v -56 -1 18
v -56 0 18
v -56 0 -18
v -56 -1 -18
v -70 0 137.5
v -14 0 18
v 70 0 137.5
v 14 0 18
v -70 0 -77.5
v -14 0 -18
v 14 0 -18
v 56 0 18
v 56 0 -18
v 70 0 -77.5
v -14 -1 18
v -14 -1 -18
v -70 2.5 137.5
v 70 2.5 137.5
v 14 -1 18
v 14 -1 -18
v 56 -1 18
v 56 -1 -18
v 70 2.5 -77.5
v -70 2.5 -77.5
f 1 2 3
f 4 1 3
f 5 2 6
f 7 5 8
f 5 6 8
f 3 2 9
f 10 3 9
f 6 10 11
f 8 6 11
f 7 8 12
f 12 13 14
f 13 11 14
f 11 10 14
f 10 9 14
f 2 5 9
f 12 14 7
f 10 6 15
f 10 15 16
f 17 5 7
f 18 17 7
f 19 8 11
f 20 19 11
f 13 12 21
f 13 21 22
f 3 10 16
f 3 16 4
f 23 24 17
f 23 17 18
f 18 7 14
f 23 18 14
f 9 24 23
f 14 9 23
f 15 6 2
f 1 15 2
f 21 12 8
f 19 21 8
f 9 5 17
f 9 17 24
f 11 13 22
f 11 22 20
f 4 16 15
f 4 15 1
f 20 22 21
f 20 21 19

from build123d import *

# Parameters (mm, degrees)
CROQUIS1_W              = 140
CROQUIS1_H              = 275
SALIENTE_EXTRUIR1_DEPTH = 2.5
CROQUIS2_W              = 42
CROQUIS2_H              = 36
SALIENTE_EXTRUIR2_DEPTH = 1
CROQUIS3_W              = 140
CROQUIS3_H              = 60
CORTAR_EXTRUIR1_DEPTH   = 4.5


with BuildPart() as part:
    # Croquis1 → Saliente-Extruir1 (new body)
    with BuildSketch(Plane(origin=(0, 0, 0), x_dir=(1, 0, 0), z_dir=(0, 1, 0))):
        Rectangle(CROQUIS1_W, CROQUIS1_H)
    extrude(amount=SALIENTE_EXTRUIR1_DEPTH)

    # Croquis2 → Saliente-Extruir2 (add)
    with BuildSketch(Plane(origin=(0, 0, 0), x_dir=(-1, 0, 0), z_dir=(0, -1, 0))):
        with Locations((35, 0)):
            Rectangle(CROQUIS2_W, CROQUIS2_H)
        with Locations((-35, 0)):
            Rectangle(CROQUIS2_W, CROQUIS2_H)
    extrude(amount=SALIENTE_EXTRUIR2_DEPTH)

    # Croquis3 → Cortar-Extruir1 (cut, through all)
    with BuildSketch(Plane(origin=(0, 2.5, 0), x_dir=(1, 0, 0), z_dir=(0, 1, 0))):
        with Locations((0, 107.5)):
            Rectangle(CROQUIS3_W, CROQUIS3_H)
    extrude(amount=-CORTAR_EXTRUIR1_DEPTH, mode=Mode.SUBTRACT)


solid = part.part
